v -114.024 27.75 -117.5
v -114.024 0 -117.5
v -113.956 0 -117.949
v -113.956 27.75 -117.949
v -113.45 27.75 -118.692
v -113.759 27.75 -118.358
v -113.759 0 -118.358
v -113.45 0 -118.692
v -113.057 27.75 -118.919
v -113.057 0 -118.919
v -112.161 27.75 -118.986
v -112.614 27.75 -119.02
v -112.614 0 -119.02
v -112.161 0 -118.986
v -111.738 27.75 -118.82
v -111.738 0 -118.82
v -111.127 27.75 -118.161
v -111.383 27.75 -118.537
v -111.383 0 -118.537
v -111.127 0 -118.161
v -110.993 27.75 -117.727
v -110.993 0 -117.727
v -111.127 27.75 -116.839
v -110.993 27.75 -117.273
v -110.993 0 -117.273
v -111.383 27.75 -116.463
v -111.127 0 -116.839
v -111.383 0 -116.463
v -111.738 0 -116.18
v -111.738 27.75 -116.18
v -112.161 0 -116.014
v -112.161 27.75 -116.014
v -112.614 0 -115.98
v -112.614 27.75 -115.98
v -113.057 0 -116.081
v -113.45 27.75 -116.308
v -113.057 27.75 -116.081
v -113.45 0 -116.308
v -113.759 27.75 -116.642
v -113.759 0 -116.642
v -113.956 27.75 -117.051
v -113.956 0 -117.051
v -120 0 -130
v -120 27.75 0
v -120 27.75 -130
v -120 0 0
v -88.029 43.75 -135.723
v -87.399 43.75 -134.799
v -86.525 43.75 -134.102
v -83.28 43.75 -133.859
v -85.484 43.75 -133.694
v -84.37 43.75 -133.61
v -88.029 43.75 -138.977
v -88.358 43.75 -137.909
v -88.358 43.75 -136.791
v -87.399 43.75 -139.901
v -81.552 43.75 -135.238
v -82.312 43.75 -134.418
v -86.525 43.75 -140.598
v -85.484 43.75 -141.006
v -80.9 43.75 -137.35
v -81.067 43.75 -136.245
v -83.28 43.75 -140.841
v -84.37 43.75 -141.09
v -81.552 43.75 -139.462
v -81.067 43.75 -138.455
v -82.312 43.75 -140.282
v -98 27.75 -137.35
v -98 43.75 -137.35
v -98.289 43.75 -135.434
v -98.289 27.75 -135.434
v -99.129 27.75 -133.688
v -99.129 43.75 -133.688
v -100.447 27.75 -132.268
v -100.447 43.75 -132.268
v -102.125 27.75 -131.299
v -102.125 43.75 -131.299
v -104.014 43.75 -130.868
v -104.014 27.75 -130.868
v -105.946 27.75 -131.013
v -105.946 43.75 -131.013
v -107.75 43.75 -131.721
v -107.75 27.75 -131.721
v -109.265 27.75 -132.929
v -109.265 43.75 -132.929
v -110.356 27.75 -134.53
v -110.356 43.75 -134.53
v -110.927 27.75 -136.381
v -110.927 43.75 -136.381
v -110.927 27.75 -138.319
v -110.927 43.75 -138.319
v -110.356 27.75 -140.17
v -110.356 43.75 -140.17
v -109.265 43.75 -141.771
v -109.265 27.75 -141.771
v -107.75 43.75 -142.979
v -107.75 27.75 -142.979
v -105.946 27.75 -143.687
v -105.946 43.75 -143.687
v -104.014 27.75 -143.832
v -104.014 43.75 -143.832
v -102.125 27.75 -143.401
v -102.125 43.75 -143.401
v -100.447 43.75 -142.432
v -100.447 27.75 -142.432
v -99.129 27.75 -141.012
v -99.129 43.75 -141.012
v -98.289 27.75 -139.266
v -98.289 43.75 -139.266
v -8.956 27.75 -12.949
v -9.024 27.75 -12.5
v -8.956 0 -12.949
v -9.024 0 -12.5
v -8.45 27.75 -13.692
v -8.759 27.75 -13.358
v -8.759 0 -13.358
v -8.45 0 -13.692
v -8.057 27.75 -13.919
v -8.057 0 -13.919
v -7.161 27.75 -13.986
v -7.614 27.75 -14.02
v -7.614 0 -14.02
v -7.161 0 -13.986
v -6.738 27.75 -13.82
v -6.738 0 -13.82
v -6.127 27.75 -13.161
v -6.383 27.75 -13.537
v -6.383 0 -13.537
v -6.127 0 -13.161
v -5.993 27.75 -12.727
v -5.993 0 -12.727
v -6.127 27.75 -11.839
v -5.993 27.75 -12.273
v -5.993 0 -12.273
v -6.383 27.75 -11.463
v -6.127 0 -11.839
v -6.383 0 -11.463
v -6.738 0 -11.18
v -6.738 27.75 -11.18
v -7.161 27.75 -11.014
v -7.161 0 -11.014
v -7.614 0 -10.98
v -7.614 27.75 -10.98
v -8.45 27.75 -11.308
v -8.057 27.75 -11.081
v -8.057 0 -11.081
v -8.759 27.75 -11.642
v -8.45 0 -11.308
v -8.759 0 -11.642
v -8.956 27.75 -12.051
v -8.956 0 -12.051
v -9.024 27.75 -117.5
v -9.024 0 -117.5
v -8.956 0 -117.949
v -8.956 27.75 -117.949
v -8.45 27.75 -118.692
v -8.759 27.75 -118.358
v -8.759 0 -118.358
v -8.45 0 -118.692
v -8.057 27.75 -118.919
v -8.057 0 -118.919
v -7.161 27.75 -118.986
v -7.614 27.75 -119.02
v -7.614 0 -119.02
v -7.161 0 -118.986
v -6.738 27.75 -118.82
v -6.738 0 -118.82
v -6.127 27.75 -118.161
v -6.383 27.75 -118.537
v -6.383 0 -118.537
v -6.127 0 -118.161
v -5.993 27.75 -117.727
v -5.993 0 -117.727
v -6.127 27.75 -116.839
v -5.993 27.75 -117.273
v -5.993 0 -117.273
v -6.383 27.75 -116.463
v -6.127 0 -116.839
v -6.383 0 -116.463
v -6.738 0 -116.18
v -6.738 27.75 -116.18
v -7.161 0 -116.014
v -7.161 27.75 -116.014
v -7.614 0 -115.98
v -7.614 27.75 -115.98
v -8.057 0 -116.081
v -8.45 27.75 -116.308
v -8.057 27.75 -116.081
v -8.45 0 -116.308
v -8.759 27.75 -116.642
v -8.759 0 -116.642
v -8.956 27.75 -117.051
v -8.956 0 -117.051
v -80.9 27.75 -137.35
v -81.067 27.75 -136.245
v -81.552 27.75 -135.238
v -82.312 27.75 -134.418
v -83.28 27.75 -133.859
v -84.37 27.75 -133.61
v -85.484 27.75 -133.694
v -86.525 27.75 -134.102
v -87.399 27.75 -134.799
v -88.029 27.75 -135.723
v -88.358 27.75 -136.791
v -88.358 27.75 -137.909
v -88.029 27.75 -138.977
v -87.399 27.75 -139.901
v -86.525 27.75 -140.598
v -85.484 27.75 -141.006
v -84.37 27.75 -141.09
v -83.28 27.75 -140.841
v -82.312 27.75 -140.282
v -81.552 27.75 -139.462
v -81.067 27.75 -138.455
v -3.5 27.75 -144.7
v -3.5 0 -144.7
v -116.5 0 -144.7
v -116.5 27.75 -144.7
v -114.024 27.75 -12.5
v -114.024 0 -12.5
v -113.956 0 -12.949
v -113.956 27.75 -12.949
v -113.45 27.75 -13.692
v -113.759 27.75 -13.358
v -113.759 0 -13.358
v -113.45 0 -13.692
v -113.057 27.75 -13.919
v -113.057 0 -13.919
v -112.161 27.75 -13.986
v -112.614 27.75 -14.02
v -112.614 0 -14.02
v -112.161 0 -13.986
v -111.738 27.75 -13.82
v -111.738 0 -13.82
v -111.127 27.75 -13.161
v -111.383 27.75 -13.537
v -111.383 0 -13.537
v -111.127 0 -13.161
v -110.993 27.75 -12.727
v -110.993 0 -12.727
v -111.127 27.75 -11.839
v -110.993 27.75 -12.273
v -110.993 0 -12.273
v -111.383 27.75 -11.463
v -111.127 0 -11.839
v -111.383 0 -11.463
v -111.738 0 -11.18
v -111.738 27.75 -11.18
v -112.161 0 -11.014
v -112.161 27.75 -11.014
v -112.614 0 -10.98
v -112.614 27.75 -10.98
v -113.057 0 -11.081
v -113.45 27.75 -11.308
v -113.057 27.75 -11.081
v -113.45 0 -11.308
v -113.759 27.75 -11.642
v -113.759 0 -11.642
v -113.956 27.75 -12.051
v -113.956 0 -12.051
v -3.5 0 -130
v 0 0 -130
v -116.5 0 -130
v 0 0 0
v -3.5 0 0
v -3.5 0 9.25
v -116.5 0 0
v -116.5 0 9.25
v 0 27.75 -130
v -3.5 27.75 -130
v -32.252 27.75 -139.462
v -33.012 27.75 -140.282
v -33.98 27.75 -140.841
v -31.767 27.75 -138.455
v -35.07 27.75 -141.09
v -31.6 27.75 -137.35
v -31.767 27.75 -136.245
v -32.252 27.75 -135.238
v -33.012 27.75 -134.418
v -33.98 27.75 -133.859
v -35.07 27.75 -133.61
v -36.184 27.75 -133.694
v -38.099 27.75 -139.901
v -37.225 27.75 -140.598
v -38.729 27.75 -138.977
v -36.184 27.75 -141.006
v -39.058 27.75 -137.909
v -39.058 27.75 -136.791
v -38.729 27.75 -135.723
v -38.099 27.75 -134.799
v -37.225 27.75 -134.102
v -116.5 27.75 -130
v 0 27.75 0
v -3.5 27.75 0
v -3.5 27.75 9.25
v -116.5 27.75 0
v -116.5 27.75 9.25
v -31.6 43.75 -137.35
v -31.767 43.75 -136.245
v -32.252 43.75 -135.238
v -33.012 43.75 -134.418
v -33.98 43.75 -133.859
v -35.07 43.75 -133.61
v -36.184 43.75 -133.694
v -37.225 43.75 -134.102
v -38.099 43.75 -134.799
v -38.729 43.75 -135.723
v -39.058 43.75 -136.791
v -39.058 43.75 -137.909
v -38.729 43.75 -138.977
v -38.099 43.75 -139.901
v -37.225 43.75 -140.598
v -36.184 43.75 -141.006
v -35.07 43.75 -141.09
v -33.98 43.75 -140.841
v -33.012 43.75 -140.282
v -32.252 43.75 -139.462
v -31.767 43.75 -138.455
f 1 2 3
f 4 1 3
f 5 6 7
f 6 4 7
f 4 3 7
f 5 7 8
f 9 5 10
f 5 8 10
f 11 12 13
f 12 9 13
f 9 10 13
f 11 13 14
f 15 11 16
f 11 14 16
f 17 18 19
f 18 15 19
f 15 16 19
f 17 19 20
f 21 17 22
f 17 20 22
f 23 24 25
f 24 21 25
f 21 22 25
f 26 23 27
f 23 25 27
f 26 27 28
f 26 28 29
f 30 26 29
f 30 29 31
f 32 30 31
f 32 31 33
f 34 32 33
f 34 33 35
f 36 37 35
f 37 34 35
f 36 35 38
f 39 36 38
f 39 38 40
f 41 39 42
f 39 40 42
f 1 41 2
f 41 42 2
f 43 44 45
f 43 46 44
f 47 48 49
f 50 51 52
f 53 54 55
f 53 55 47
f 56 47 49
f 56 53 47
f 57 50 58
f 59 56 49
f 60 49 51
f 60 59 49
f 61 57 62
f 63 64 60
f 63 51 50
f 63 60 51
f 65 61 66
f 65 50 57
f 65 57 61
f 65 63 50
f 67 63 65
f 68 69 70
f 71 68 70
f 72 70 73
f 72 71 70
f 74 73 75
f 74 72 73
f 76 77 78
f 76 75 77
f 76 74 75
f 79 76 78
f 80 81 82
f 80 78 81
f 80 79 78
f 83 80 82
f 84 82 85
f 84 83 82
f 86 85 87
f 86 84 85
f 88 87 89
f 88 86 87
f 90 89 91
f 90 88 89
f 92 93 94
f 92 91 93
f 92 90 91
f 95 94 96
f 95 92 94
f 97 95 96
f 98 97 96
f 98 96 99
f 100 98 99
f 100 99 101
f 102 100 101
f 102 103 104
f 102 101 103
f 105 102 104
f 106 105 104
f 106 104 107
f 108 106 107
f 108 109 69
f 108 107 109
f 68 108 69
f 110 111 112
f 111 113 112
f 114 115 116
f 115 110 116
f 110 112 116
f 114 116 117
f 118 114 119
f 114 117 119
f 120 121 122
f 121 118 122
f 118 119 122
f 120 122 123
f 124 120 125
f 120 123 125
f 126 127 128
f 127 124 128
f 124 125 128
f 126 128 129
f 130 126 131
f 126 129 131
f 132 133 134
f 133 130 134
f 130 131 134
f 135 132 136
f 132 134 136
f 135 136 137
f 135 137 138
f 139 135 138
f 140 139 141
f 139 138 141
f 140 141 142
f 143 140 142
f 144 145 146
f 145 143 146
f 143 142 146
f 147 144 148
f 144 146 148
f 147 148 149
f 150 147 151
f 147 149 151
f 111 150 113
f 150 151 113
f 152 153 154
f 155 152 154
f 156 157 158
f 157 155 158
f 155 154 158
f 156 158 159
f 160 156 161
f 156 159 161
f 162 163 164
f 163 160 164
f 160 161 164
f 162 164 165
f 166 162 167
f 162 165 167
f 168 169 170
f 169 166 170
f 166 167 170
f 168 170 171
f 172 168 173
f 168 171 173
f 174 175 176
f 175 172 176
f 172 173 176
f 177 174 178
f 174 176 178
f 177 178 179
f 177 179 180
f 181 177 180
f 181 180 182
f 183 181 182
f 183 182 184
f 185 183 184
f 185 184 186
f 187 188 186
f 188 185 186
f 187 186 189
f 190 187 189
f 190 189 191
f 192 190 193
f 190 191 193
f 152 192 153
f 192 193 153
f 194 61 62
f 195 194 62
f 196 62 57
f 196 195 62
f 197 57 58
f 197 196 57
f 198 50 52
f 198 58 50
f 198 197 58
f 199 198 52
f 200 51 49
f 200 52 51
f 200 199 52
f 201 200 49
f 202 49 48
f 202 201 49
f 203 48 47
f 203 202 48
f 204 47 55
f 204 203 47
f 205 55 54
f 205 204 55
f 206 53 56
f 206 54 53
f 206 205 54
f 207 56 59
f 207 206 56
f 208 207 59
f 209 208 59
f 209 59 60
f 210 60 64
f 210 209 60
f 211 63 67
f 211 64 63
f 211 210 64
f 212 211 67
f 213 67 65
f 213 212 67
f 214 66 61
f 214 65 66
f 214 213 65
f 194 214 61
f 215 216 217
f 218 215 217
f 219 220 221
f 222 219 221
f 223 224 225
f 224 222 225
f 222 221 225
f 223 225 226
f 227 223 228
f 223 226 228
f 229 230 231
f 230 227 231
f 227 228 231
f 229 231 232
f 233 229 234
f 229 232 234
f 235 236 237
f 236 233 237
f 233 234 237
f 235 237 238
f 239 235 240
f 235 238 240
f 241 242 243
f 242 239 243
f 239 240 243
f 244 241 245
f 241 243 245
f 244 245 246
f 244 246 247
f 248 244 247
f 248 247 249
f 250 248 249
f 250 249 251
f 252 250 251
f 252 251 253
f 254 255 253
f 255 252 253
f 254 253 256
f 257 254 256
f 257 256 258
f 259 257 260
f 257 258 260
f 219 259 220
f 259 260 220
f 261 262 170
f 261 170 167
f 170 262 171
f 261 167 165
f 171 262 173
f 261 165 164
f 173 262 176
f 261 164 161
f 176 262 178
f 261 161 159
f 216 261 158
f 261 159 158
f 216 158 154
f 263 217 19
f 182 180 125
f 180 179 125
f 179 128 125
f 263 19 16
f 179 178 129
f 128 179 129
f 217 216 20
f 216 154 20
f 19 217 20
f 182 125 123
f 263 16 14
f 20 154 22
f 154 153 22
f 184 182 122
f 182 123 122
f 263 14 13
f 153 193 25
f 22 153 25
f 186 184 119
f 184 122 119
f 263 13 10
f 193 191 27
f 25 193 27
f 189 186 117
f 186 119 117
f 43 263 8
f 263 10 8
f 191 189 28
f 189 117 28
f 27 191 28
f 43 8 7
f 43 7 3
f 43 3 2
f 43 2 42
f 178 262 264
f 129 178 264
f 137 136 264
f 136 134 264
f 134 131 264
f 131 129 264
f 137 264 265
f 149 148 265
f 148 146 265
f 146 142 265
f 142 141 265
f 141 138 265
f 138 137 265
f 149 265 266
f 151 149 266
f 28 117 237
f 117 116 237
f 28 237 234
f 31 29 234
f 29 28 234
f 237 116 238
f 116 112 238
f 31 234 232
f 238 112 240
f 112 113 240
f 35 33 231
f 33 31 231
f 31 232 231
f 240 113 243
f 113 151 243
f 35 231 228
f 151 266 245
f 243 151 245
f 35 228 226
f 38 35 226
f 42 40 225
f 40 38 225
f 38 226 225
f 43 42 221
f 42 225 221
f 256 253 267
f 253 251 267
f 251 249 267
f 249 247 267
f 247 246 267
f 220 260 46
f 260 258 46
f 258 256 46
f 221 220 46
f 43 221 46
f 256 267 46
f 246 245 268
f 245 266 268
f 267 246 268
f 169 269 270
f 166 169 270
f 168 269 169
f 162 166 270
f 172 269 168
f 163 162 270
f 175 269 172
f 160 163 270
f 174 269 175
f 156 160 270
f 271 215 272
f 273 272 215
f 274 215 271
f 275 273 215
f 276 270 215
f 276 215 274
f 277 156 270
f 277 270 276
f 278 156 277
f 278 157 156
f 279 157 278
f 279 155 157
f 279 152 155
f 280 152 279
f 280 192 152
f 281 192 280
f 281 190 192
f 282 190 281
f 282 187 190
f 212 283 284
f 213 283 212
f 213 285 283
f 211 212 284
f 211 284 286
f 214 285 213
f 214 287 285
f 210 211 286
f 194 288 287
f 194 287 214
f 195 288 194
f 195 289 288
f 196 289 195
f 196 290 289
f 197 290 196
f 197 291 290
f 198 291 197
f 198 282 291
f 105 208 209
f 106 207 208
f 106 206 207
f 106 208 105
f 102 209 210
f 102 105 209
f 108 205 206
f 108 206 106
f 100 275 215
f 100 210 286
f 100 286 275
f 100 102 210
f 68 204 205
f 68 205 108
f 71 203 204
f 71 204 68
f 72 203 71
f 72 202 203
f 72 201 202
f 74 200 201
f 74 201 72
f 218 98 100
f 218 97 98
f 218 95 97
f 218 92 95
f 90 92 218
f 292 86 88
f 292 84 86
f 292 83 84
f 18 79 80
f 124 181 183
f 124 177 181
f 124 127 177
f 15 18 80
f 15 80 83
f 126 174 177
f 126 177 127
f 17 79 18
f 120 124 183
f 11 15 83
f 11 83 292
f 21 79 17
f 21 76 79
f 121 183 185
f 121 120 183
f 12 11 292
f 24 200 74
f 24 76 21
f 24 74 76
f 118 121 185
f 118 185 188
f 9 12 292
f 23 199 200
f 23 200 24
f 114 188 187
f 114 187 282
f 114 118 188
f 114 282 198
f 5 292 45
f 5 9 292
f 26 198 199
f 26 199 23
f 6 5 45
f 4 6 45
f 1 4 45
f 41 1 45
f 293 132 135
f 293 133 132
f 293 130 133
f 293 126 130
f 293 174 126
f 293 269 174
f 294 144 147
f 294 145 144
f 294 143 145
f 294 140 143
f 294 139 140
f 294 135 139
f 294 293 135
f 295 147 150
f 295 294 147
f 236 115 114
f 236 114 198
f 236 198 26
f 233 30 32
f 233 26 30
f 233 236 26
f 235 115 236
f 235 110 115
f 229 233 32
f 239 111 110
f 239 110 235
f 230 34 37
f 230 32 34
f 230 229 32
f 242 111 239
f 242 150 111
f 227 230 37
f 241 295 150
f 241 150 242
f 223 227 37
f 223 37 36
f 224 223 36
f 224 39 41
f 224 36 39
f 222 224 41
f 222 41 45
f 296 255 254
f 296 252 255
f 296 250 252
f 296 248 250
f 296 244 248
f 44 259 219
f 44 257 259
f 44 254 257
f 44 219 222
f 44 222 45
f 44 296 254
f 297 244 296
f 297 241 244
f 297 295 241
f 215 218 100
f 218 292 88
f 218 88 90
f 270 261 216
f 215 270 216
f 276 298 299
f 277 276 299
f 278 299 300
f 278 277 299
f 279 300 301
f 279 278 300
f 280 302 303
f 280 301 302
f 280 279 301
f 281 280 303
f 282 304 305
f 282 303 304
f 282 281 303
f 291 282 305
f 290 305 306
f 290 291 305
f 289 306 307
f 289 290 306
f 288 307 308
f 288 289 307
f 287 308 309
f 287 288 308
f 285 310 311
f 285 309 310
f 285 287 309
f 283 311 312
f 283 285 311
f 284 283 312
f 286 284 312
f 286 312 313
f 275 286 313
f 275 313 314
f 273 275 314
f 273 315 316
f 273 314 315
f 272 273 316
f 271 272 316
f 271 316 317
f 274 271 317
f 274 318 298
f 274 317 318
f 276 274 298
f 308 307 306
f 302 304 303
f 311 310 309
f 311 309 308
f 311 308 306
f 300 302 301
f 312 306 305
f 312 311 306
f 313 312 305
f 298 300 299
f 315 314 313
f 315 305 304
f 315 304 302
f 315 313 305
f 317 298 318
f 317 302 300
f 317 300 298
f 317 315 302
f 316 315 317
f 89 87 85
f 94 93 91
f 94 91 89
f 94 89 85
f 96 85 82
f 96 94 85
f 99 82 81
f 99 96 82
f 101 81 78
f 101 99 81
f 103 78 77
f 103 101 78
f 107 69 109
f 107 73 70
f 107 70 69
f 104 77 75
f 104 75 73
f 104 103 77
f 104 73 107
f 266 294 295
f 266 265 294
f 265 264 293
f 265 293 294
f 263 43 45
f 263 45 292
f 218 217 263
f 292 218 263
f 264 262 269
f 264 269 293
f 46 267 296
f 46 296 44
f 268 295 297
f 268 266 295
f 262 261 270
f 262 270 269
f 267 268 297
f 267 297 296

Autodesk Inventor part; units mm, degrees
ref_plane "YZ Plane" through (0, 0, 0) normal (1, 0, 0) x (0, 1, 0)
ref_plane "XZ Plane" through (0, 0, 0) normal (0, 1, 0) x (-1, 0, 0)
ref_plane "XY Plane" through (0, 0, 0) normal (0, 0, 1) x (1, 0, 0)
sketch "Sketch1" plane through (0, 0, 0) normal (0, 1, 0) x (-1, 0, 0)
  line L0 (0, 0) -> (120, 0)
  line L1 (120, 0) -> (120, -130)
  line L2 (120, -130) -> (0, -130)
  line L3 (0, -130) -> (0, 0)
  line L4 (112.5, -12.5) -> (7.5, -12.5) construction
  line L5 (7.5, -12.5) -> (7.5, -117.5) construction
  line L6 (7.5, -117.5) -> (112.5, -117.5) construction
  line L7 (112.5, -117.5) -> (112.5, -12.5) construction
  circle A0 centre (112.5, -12.5) radius 1.524
  circle A1 centre (112.5, -117.5) radius 1.524
  circle A2 centre (7.5, -12.5) radius 1.524
  circle A3 centre (7.5, -117.5) radius 1.524
  line L8 (116.5, -130) -> (3.5, -130)
  line L9 (3.5, -130) -> (3.5, -144.7)
  line L10 (3.5, -144.7) -> (116.5, -144.7)
  line L11 (116.5, -144.7) -> (116.5, -130)
  line L12 (116.5, 0) -> (3.5, 0)
  line L13 (3.5, 0) -> (3.5, 9.25)
  line L14 (3.5, 9.25) -> (116.5, 9.25)
  line L15 (116.5, 9.25) -> (116.5, 0)
  point P0 (112.5, -65)
  point P1 (120, -65)
  point P2 (60, -117.5)
  point P3 (60, -130)
  point P4 (60, -144.7)
  point P5 (60, -130)
  point P6 (116.5, 4.625)
  point P7 (116.5, -137.35)
  point P8 (3.5, 0)
  point P9 (3.5, -130)
  dimension "d0" = 130
  dimension "d1" = 120
  dimension "d2" = 105
  dimension "d3" = 3.048
  dimension "d4" = 14.7
  dimension "d5" = 113
  dimension "d6" = 9.25
extrude "Extrusion1" add sketch "Sketch1" along normal blind 27.75
sketch "Sketch2" plane through (0, 27.75, 0) normal (0, 1, 0) x (1, 0, 0)
  circle A0 centre (-104.5, 137.35) radius 6.5
  circle A1 centre (-84.65, 137.35) radius 3.75
  circle A2 centre (-35.35, 137.35) radius 3.75
  line L0 (-116.5, 144.7) -> (-116.5, 130) projected
  line L1 (-3.5, 130) -> (-3.5, 144.7) projected
  point P0 (0, 0)
  point P1 (-116.5, 137.35)
  point P2 (-116.5, 137.35)
  point P3 (-116.5, 137.35)
  point P4 (-116.5, 137.35)
  point P5 (-3.5, 137.35)
  dimension "d9" = 13
  dimension "d10" = 7.5
  dimension "d11" = 12
  dimension "d12" = 31.85
  dimension "d13" = 31.85
extrude "Extrusion2" add sketch "Sketch2" along normal blind 16
equation "\"d13\" = d12"
properties part number "Radiator"
